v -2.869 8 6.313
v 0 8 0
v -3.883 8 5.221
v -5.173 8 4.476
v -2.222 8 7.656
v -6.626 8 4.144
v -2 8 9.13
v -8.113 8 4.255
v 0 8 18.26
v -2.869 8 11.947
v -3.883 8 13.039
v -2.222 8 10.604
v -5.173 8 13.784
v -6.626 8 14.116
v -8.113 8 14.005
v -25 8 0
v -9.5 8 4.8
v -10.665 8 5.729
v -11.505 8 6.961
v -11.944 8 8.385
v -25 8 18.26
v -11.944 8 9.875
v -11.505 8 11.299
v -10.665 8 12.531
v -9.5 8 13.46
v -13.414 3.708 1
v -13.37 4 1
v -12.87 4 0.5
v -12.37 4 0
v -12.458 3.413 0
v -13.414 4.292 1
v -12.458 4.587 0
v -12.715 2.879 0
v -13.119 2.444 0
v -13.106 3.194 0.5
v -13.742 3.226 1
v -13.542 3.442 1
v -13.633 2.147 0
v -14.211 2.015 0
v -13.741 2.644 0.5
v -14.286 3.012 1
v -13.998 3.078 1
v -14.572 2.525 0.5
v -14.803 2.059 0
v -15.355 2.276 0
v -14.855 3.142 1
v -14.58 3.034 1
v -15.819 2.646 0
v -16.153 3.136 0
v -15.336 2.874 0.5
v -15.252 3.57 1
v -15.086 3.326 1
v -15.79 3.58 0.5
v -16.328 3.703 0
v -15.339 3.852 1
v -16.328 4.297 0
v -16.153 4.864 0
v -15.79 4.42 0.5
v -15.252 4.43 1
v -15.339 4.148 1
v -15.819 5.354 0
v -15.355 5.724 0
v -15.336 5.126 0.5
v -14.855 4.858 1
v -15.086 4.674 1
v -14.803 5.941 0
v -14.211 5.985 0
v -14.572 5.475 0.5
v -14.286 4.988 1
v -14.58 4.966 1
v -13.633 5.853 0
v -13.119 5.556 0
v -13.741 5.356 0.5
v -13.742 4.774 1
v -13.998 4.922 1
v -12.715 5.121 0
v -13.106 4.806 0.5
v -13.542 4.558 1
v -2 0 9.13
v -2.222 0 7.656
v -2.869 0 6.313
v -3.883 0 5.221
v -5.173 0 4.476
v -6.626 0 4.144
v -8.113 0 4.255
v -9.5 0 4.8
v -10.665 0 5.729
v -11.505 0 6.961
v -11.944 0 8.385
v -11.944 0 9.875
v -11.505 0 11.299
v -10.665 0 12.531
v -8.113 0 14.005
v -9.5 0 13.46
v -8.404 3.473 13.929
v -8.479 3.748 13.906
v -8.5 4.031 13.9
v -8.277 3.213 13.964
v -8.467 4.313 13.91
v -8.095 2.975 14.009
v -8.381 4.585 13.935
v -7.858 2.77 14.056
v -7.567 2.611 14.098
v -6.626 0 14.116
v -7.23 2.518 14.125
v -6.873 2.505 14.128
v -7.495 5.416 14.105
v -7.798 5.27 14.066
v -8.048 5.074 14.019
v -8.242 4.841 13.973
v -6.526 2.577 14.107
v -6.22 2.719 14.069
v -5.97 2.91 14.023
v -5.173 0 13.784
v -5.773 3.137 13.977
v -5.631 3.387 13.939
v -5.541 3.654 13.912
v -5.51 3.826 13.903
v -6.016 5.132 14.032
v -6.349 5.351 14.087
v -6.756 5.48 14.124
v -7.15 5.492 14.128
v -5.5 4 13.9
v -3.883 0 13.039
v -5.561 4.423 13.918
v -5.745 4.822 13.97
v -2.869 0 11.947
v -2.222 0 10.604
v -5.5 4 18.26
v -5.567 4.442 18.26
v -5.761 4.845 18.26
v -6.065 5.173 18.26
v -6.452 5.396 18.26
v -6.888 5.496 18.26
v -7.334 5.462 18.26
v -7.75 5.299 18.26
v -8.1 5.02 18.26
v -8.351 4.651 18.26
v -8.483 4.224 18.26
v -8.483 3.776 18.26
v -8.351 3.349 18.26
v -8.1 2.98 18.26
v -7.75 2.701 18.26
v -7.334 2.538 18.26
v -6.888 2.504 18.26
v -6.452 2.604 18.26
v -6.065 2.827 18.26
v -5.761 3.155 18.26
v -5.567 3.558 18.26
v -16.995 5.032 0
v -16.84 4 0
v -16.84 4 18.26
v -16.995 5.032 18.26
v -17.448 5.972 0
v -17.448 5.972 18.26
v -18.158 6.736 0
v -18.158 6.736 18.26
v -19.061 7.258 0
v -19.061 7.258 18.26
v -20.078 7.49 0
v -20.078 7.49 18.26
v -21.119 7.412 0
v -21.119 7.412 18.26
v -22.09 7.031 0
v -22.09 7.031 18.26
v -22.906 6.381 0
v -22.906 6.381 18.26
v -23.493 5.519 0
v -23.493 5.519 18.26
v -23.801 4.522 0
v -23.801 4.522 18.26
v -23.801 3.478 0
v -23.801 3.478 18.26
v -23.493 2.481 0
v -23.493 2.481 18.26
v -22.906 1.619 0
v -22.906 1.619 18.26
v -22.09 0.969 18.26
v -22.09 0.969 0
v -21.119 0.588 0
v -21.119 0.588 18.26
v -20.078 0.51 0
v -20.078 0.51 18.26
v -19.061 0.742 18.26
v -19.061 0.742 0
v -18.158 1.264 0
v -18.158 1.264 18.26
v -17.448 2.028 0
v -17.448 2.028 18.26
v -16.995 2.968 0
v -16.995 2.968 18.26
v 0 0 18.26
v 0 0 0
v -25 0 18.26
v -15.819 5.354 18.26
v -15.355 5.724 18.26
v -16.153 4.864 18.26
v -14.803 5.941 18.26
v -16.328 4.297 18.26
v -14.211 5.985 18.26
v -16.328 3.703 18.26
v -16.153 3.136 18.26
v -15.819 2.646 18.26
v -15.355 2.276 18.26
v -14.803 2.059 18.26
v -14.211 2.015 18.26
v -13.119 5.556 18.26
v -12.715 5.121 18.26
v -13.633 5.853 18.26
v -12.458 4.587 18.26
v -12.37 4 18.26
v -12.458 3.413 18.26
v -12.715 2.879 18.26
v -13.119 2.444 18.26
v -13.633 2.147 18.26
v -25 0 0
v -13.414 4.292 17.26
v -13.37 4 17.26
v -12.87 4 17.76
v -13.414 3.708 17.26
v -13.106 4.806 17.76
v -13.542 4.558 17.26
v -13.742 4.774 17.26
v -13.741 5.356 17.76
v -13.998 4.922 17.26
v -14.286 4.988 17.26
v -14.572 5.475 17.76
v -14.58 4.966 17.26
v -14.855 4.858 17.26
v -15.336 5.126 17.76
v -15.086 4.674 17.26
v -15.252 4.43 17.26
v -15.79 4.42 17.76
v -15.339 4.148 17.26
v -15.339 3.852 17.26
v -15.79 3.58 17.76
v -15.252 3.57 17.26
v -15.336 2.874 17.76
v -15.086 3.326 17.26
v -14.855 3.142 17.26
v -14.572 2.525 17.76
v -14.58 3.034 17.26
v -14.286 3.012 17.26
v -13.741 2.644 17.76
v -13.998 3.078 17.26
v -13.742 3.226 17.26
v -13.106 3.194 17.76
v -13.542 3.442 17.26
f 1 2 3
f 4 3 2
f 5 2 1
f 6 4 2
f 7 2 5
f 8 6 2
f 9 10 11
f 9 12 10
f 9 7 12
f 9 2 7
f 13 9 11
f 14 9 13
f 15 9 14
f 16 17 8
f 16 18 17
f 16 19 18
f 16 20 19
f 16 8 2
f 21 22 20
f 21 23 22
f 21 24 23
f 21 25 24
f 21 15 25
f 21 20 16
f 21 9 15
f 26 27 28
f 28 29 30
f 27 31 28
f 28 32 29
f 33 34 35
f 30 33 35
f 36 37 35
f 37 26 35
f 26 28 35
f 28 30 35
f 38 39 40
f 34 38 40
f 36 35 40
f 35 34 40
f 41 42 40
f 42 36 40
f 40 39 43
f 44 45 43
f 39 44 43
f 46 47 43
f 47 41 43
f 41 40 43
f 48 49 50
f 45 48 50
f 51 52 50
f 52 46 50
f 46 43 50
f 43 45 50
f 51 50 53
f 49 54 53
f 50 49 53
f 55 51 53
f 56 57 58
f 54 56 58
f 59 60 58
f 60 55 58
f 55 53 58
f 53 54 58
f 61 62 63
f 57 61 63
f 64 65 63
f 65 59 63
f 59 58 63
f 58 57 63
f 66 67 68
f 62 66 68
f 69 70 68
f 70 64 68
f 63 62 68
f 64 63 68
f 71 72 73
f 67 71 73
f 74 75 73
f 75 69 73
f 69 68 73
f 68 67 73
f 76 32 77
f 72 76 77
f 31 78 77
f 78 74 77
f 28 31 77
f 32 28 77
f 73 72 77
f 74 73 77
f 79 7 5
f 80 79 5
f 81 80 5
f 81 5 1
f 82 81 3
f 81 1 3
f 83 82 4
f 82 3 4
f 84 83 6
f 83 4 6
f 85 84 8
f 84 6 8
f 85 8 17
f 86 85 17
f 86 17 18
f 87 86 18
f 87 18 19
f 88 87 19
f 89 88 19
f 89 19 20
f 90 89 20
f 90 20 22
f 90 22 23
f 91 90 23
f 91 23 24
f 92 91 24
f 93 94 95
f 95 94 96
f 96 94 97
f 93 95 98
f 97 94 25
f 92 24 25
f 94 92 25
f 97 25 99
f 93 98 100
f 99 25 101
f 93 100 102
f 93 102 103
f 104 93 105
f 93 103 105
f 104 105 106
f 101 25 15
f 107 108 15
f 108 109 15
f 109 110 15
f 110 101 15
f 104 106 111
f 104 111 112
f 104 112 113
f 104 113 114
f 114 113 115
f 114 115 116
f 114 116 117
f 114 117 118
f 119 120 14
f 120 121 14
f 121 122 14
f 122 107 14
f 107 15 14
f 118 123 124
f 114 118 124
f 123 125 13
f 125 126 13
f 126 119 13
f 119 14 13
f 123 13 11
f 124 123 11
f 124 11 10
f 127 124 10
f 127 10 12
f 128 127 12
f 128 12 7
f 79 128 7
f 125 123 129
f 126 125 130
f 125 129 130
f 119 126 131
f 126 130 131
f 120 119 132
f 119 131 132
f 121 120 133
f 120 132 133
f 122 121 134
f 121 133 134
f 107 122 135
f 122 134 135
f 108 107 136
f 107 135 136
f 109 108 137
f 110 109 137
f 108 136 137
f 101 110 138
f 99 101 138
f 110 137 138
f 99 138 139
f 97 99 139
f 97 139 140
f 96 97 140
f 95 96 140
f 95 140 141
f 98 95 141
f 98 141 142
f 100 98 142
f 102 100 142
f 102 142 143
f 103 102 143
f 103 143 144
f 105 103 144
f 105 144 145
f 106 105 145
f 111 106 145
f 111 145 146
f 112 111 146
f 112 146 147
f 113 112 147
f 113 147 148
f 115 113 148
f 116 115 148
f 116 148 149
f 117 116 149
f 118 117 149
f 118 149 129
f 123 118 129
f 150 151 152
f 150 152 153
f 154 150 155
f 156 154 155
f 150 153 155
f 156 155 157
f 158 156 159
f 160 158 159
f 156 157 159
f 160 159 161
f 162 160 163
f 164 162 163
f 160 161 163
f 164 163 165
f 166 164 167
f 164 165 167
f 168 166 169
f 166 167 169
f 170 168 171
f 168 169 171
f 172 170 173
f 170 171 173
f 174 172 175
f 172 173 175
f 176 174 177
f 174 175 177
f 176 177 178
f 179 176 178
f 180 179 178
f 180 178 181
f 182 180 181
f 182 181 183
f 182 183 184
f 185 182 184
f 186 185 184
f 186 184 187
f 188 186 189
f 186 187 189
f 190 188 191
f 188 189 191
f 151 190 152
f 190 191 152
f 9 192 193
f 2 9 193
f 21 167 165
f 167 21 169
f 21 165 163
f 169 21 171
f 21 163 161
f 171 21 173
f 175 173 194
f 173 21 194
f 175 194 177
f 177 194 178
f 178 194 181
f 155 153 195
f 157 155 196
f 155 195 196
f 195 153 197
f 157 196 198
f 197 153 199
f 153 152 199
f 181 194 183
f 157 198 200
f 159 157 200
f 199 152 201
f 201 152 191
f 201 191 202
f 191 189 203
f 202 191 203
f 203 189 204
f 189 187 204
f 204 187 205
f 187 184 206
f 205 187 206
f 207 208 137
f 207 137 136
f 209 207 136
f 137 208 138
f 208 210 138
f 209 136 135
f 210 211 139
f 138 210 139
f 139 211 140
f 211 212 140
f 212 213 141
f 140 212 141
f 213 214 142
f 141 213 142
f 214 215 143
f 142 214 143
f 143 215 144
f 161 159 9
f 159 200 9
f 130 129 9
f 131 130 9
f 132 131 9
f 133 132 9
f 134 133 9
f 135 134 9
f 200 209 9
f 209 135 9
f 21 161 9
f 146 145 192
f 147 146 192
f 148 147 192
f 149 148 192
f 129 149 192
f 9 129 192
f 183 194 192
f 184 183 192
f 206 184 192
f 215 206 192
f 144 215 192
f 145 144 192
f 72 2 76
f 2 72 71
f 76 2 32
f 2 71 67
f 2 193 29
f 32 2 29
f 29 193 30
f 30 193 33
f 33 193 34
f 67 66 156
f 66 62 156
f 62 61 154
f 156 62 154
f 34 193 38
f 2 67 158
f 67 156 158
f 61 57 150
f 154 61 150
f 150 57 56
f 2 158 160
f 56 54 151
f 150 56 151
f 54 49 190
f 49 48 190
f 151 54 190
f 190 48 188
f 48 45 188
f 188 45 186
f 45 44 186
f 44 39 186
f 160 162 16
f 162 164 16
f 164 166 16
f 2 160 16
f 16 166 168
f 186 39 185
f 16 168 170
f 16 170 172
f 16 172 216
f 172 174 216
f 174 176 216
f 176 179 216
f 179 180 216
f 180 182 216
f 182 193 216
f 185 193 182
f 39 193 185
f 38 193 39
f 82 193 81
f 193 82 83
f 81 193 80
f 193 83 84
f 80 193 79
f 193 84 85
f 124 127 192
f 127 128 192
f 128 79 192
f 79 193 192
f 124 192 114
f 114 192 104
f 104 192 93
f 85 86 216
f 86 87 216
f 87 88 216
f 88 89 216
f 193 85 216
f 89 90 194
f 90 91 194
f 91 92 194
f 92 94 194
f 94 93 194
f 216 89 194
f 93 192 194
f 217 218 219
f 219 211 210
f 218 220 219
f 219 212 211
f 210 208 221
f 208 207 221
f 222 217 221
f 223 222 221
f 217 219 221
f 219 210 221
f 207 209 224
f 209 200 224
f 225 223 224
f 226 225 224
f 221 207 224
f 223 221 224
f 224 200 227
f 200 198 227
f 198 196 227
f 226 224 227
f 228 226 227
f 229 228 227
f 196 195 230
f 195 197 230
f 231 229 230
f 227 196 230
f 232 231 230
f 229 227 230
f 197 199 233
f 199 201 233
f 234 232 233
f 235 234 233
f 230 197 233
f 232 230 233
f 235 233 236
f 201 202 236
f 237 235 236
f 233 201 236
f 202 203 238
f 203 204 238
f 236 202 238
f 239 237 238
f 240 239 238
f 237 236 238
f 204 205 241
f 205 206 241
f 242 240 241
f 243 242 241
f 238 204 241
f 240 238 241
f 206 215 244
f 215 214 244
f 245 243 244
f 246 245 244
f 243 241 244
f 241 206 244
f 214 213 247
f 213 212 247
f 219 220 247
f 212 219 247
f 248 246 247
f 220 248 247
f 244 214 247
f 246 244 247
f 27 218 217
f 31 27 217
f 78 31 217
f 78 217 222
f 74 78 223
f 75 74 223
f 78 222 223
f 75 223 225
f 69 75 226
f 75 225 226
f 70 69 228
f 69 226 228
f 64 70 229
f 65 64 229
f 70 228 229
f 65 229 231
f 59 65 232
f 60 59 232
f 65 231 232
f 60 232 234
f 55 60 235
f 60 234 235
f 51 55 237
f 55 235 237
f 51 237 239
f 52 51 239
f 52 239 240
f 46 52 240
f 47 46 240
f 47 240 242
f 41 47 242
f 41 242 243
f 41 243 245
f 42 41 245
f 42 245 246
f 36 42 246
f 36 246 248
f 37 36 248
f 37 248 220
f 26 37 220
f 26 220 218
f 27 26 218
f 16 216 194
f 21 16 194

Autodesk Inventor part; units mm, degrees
ref_plane "YZ Plane" through (0, 0, 0) normal (1, 0, 0) x (0, 1, 0)
ref_plane "XZ Plane" through (0, 0, 0) normal (0, 1, 0) x (-1, 0, 0)
ref_plane "XY Plane" through (0, 0, 0) normal (0, 0, 1) x (1, 0, 0)
sketch "Sketch1" plane through (0, 0, 0) normal (0, 1, 0) x (-1, 0, 0)
  line L0 (0, 0) -> (25, 0)
  line L1 (25, 0) -> (25, 18.26)
  line L2 (25, 18.26) -> (0, 18.26)
  line L3 (0, 18.26) -> (0, 0)
  dimension "d0" = 25
  dimension "d1" = 18.26
extrude "Extrusion1" add sketch "Sketch1" along normal blind 8
sketch "Sketch2" plane through (0, 8, 0) normal (0, 1, 0) x (1, 0, 0)
  line L0 (0, 0) -> (-25, 0) projected
  line L1 (0, -18.26) -> (0, 0) projected
  circle A0 centre (-7, -9.13) radius 5
  dimension "d4" = 10
  dimension "d5" = 7
  dimension "d6" = 9.13
extrude "Extrusion2" cut sketch "Sketch2" against normal blind 8
sketch "Sketch3" plane through (-25, 0, 18.26) normal (0, 0, 1) x (1, 0, 0)
  line L0 (0, 0) -> (25, 0) projected
  line L1 (25, 0) -> (25, 8) projected
  circle A0 centre (4.66, 4) radius 3.5
  circle A1 centre (10.64, 4) radius 0.9905
  dimension "d9" = 7
  dimension "d10" = 1.981
  dimension "d13" = 14.36
  dimension "d14" = 20.34
  dimension "d15" = 4
extrude "Extrusion3" cut sketch "Sketch3" against normal blind 18.5
sketch "Sketch4" plane through (-25, 0, 18.26) normal (0, 0, 1) x (1, 0, 0)
  line L0 (0, 0) -> (25, 0) projected
  line L1 (25, 0) -> (25, 8) projected
  circle A0 centre (18, 4) radius 1.5
  dimension "d18" = 3
  dimension "d19" = 7
  dimension "d20" = 4
extrude "Extrusion4" cut sketch "Sketch4" against normal blind 6.5
chamfer "Chamfer1" distance 1 angle 45 2 edges at (-15.3505, 4, 18.26) (-15.3505, 4, 0)
properties part number "HeaterBlock"
